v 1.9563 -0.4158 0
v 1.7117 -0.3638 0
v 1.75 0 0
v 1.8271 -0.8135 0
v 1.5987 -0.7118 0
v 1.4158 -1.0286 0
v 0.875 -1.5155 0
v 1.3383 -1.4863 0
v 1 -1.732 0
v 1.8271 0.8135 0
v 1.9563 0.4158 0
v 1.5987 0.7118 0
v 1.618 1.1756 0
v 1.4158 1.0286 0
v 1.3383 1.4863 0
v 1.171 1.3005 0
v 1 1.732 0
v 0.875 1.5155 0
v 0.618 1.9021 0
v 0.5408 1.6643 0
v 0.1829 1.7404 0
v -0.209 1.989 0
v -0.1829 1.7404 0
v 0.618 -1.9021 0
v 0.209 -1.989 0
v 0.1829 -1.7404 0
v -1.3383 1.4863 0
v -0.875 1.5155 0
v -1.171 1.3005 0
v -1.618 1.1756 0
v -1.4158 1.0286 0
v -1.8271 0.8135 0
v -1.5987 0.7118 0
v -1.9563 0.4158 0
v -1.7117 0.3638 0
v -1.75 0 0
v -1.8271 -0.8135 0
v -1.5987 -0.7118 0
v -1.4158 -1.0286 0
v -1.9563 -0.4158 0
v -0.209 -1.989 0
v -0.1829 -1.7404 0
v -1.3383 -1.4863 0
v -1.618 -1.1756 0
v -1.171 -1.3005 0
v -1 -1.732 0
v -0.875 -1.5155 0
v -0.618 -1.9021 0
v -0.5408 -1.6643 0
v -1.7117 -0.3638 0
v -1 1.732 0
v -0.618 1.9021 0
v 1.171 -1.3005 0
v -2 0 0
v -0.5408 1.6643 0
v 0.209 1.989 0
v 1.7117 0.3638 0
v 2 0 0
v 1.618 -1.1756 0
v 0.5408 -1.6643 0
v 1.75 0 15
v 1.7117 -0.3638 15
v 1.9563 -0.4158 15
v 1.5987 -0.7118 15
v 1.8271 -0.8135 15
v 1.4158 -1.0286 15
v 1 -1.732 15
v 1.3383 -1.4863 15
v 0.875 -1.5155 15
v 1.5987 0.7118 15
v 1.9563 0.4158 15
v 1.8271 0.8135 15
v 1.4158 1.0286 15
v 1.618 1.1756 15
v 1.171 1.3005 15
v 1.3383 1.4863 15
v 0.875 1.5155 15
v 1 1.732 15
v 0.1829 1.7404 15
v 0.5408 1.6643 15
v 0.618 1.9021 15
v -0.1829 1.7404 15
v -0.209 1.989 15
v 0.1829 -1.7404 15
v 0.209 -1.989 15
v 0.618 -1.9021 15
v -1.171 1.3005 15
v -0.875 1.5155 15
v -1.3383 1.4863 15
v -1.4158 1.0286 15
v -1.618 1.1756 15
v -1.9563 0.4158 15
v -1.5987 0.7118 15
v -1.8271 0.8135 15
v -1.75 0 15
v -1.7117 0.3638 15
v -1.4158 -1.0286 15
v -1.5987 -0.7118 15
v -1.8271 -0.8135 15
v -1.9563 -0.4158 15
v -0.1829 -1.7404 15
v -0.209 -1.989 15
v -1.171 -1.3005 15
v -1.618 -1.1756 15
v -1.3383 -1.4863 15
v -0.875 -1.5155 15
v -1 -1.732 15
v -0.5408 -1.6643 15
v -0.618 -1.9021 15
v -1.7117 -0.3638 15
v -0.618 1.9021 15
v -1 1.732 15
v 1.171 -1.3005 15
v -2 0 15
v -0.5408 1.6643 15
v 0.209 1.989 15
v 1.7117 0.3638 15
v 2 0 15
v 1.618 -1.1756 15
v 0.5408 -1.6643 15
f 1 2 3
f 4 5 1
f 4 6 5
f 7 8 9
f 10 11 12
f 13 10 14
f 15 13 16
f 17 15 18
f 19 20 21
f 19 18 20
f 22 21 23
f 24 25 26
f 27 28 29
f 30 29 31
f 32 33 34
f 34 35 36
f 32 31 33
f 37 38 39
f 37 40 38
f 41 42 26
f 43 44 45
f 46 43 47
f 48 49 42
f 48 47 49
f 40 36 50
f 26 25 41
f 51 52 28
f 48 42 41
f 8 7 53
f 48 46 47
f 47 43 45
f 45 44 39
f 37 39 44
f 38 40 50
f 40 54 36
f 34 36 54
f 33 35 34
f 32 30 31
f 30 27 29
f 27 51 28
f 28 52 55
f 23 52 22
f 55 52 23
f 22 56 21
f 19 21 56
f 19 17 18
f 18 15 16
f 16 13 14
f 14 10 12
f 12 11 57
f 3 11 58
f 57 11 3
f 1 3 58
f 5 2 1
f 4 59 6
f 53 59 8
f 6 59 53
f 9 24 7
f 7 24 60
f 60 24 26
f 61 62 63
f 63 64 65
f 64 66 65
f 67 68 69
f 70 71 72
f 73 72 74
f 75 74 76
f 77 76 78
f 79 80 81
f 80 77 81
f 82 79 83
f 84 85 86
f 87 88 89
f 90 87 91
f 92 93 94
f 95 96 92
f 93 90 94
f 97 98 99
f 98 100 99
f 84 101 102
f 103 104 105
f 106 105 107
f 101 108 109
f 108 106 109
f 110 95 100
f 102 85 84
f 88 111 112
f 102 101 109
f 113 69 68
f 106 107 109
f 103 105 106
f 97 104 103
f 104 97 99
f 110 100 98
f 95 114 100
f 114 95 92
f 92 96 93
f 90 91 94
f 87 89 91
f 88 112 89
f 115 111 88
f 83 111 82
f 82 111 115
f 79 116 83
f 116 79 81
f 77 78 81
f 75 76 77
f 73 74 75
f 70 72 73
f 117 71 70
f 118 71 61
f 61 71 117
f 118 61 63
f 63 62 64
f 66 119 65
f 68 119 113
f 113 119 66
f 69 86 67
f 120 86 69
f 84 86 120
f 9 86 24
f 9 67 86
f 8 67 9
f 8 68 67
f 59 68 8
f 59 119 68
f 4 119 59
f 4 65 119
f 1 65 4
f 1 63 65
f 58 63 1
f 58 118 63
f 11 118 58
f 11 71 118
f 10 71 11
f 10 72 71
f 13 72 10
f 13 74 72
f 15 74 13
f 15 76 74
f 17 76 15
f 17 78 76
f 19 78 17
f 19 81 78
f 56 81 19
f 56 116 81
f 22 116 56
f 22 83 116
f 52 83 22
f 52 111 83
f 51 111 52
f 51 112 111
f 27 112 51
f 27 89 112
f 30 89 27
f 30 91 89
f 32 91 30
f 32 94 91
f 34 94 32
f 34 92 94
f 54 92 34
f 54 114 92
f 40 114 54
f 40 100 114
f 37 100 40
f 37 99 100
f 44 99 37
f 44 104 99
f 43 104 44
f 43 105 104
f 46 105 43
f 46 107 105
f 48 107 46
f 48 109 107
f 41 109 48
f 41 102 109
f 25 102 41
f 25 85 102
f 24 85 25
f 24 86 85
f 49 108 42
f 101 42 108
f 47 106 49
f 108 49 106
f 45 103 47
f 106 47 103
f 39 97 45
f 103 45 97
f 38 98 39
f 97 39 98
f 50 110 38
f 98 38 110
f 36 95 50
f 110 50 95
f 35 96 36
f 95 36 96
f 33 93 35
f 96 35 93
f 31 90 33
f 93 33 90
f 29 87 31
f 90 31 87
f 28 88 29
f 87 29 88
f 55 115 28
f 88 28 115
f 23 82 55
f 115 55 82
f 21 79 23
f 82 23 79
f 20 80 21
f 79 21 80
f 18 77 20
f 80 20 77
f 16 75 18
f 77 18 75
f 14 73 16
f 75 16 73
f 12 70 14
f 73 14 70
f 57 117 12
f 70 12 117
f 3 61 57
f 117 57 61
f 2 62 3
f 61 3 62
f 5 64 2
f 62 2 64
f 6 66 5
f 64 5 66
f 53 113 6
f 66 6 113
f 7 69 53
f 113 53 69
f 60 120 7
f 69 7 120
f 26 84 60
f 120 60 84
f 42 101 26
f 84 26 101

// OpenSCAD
// Nicolì Angelo 2023 - THIS CODE IS LICENSED AS GPL-2.0


module Pipe(){
Pipe_Lenght = 15;
Pipe_Dext = 4;
Pipe_Dint = 3.5;

color("#a8b0b2")
linear_extrude(Pipe_Lenght, $fn = $preview? 90: 30) 

difference(){
circle(d = Pipe_Dext, $fn = $preview? 90: 30);
circle(d = Pipe_Dint, $fn = $preview? 90: 30);
}

}


Pipe();
